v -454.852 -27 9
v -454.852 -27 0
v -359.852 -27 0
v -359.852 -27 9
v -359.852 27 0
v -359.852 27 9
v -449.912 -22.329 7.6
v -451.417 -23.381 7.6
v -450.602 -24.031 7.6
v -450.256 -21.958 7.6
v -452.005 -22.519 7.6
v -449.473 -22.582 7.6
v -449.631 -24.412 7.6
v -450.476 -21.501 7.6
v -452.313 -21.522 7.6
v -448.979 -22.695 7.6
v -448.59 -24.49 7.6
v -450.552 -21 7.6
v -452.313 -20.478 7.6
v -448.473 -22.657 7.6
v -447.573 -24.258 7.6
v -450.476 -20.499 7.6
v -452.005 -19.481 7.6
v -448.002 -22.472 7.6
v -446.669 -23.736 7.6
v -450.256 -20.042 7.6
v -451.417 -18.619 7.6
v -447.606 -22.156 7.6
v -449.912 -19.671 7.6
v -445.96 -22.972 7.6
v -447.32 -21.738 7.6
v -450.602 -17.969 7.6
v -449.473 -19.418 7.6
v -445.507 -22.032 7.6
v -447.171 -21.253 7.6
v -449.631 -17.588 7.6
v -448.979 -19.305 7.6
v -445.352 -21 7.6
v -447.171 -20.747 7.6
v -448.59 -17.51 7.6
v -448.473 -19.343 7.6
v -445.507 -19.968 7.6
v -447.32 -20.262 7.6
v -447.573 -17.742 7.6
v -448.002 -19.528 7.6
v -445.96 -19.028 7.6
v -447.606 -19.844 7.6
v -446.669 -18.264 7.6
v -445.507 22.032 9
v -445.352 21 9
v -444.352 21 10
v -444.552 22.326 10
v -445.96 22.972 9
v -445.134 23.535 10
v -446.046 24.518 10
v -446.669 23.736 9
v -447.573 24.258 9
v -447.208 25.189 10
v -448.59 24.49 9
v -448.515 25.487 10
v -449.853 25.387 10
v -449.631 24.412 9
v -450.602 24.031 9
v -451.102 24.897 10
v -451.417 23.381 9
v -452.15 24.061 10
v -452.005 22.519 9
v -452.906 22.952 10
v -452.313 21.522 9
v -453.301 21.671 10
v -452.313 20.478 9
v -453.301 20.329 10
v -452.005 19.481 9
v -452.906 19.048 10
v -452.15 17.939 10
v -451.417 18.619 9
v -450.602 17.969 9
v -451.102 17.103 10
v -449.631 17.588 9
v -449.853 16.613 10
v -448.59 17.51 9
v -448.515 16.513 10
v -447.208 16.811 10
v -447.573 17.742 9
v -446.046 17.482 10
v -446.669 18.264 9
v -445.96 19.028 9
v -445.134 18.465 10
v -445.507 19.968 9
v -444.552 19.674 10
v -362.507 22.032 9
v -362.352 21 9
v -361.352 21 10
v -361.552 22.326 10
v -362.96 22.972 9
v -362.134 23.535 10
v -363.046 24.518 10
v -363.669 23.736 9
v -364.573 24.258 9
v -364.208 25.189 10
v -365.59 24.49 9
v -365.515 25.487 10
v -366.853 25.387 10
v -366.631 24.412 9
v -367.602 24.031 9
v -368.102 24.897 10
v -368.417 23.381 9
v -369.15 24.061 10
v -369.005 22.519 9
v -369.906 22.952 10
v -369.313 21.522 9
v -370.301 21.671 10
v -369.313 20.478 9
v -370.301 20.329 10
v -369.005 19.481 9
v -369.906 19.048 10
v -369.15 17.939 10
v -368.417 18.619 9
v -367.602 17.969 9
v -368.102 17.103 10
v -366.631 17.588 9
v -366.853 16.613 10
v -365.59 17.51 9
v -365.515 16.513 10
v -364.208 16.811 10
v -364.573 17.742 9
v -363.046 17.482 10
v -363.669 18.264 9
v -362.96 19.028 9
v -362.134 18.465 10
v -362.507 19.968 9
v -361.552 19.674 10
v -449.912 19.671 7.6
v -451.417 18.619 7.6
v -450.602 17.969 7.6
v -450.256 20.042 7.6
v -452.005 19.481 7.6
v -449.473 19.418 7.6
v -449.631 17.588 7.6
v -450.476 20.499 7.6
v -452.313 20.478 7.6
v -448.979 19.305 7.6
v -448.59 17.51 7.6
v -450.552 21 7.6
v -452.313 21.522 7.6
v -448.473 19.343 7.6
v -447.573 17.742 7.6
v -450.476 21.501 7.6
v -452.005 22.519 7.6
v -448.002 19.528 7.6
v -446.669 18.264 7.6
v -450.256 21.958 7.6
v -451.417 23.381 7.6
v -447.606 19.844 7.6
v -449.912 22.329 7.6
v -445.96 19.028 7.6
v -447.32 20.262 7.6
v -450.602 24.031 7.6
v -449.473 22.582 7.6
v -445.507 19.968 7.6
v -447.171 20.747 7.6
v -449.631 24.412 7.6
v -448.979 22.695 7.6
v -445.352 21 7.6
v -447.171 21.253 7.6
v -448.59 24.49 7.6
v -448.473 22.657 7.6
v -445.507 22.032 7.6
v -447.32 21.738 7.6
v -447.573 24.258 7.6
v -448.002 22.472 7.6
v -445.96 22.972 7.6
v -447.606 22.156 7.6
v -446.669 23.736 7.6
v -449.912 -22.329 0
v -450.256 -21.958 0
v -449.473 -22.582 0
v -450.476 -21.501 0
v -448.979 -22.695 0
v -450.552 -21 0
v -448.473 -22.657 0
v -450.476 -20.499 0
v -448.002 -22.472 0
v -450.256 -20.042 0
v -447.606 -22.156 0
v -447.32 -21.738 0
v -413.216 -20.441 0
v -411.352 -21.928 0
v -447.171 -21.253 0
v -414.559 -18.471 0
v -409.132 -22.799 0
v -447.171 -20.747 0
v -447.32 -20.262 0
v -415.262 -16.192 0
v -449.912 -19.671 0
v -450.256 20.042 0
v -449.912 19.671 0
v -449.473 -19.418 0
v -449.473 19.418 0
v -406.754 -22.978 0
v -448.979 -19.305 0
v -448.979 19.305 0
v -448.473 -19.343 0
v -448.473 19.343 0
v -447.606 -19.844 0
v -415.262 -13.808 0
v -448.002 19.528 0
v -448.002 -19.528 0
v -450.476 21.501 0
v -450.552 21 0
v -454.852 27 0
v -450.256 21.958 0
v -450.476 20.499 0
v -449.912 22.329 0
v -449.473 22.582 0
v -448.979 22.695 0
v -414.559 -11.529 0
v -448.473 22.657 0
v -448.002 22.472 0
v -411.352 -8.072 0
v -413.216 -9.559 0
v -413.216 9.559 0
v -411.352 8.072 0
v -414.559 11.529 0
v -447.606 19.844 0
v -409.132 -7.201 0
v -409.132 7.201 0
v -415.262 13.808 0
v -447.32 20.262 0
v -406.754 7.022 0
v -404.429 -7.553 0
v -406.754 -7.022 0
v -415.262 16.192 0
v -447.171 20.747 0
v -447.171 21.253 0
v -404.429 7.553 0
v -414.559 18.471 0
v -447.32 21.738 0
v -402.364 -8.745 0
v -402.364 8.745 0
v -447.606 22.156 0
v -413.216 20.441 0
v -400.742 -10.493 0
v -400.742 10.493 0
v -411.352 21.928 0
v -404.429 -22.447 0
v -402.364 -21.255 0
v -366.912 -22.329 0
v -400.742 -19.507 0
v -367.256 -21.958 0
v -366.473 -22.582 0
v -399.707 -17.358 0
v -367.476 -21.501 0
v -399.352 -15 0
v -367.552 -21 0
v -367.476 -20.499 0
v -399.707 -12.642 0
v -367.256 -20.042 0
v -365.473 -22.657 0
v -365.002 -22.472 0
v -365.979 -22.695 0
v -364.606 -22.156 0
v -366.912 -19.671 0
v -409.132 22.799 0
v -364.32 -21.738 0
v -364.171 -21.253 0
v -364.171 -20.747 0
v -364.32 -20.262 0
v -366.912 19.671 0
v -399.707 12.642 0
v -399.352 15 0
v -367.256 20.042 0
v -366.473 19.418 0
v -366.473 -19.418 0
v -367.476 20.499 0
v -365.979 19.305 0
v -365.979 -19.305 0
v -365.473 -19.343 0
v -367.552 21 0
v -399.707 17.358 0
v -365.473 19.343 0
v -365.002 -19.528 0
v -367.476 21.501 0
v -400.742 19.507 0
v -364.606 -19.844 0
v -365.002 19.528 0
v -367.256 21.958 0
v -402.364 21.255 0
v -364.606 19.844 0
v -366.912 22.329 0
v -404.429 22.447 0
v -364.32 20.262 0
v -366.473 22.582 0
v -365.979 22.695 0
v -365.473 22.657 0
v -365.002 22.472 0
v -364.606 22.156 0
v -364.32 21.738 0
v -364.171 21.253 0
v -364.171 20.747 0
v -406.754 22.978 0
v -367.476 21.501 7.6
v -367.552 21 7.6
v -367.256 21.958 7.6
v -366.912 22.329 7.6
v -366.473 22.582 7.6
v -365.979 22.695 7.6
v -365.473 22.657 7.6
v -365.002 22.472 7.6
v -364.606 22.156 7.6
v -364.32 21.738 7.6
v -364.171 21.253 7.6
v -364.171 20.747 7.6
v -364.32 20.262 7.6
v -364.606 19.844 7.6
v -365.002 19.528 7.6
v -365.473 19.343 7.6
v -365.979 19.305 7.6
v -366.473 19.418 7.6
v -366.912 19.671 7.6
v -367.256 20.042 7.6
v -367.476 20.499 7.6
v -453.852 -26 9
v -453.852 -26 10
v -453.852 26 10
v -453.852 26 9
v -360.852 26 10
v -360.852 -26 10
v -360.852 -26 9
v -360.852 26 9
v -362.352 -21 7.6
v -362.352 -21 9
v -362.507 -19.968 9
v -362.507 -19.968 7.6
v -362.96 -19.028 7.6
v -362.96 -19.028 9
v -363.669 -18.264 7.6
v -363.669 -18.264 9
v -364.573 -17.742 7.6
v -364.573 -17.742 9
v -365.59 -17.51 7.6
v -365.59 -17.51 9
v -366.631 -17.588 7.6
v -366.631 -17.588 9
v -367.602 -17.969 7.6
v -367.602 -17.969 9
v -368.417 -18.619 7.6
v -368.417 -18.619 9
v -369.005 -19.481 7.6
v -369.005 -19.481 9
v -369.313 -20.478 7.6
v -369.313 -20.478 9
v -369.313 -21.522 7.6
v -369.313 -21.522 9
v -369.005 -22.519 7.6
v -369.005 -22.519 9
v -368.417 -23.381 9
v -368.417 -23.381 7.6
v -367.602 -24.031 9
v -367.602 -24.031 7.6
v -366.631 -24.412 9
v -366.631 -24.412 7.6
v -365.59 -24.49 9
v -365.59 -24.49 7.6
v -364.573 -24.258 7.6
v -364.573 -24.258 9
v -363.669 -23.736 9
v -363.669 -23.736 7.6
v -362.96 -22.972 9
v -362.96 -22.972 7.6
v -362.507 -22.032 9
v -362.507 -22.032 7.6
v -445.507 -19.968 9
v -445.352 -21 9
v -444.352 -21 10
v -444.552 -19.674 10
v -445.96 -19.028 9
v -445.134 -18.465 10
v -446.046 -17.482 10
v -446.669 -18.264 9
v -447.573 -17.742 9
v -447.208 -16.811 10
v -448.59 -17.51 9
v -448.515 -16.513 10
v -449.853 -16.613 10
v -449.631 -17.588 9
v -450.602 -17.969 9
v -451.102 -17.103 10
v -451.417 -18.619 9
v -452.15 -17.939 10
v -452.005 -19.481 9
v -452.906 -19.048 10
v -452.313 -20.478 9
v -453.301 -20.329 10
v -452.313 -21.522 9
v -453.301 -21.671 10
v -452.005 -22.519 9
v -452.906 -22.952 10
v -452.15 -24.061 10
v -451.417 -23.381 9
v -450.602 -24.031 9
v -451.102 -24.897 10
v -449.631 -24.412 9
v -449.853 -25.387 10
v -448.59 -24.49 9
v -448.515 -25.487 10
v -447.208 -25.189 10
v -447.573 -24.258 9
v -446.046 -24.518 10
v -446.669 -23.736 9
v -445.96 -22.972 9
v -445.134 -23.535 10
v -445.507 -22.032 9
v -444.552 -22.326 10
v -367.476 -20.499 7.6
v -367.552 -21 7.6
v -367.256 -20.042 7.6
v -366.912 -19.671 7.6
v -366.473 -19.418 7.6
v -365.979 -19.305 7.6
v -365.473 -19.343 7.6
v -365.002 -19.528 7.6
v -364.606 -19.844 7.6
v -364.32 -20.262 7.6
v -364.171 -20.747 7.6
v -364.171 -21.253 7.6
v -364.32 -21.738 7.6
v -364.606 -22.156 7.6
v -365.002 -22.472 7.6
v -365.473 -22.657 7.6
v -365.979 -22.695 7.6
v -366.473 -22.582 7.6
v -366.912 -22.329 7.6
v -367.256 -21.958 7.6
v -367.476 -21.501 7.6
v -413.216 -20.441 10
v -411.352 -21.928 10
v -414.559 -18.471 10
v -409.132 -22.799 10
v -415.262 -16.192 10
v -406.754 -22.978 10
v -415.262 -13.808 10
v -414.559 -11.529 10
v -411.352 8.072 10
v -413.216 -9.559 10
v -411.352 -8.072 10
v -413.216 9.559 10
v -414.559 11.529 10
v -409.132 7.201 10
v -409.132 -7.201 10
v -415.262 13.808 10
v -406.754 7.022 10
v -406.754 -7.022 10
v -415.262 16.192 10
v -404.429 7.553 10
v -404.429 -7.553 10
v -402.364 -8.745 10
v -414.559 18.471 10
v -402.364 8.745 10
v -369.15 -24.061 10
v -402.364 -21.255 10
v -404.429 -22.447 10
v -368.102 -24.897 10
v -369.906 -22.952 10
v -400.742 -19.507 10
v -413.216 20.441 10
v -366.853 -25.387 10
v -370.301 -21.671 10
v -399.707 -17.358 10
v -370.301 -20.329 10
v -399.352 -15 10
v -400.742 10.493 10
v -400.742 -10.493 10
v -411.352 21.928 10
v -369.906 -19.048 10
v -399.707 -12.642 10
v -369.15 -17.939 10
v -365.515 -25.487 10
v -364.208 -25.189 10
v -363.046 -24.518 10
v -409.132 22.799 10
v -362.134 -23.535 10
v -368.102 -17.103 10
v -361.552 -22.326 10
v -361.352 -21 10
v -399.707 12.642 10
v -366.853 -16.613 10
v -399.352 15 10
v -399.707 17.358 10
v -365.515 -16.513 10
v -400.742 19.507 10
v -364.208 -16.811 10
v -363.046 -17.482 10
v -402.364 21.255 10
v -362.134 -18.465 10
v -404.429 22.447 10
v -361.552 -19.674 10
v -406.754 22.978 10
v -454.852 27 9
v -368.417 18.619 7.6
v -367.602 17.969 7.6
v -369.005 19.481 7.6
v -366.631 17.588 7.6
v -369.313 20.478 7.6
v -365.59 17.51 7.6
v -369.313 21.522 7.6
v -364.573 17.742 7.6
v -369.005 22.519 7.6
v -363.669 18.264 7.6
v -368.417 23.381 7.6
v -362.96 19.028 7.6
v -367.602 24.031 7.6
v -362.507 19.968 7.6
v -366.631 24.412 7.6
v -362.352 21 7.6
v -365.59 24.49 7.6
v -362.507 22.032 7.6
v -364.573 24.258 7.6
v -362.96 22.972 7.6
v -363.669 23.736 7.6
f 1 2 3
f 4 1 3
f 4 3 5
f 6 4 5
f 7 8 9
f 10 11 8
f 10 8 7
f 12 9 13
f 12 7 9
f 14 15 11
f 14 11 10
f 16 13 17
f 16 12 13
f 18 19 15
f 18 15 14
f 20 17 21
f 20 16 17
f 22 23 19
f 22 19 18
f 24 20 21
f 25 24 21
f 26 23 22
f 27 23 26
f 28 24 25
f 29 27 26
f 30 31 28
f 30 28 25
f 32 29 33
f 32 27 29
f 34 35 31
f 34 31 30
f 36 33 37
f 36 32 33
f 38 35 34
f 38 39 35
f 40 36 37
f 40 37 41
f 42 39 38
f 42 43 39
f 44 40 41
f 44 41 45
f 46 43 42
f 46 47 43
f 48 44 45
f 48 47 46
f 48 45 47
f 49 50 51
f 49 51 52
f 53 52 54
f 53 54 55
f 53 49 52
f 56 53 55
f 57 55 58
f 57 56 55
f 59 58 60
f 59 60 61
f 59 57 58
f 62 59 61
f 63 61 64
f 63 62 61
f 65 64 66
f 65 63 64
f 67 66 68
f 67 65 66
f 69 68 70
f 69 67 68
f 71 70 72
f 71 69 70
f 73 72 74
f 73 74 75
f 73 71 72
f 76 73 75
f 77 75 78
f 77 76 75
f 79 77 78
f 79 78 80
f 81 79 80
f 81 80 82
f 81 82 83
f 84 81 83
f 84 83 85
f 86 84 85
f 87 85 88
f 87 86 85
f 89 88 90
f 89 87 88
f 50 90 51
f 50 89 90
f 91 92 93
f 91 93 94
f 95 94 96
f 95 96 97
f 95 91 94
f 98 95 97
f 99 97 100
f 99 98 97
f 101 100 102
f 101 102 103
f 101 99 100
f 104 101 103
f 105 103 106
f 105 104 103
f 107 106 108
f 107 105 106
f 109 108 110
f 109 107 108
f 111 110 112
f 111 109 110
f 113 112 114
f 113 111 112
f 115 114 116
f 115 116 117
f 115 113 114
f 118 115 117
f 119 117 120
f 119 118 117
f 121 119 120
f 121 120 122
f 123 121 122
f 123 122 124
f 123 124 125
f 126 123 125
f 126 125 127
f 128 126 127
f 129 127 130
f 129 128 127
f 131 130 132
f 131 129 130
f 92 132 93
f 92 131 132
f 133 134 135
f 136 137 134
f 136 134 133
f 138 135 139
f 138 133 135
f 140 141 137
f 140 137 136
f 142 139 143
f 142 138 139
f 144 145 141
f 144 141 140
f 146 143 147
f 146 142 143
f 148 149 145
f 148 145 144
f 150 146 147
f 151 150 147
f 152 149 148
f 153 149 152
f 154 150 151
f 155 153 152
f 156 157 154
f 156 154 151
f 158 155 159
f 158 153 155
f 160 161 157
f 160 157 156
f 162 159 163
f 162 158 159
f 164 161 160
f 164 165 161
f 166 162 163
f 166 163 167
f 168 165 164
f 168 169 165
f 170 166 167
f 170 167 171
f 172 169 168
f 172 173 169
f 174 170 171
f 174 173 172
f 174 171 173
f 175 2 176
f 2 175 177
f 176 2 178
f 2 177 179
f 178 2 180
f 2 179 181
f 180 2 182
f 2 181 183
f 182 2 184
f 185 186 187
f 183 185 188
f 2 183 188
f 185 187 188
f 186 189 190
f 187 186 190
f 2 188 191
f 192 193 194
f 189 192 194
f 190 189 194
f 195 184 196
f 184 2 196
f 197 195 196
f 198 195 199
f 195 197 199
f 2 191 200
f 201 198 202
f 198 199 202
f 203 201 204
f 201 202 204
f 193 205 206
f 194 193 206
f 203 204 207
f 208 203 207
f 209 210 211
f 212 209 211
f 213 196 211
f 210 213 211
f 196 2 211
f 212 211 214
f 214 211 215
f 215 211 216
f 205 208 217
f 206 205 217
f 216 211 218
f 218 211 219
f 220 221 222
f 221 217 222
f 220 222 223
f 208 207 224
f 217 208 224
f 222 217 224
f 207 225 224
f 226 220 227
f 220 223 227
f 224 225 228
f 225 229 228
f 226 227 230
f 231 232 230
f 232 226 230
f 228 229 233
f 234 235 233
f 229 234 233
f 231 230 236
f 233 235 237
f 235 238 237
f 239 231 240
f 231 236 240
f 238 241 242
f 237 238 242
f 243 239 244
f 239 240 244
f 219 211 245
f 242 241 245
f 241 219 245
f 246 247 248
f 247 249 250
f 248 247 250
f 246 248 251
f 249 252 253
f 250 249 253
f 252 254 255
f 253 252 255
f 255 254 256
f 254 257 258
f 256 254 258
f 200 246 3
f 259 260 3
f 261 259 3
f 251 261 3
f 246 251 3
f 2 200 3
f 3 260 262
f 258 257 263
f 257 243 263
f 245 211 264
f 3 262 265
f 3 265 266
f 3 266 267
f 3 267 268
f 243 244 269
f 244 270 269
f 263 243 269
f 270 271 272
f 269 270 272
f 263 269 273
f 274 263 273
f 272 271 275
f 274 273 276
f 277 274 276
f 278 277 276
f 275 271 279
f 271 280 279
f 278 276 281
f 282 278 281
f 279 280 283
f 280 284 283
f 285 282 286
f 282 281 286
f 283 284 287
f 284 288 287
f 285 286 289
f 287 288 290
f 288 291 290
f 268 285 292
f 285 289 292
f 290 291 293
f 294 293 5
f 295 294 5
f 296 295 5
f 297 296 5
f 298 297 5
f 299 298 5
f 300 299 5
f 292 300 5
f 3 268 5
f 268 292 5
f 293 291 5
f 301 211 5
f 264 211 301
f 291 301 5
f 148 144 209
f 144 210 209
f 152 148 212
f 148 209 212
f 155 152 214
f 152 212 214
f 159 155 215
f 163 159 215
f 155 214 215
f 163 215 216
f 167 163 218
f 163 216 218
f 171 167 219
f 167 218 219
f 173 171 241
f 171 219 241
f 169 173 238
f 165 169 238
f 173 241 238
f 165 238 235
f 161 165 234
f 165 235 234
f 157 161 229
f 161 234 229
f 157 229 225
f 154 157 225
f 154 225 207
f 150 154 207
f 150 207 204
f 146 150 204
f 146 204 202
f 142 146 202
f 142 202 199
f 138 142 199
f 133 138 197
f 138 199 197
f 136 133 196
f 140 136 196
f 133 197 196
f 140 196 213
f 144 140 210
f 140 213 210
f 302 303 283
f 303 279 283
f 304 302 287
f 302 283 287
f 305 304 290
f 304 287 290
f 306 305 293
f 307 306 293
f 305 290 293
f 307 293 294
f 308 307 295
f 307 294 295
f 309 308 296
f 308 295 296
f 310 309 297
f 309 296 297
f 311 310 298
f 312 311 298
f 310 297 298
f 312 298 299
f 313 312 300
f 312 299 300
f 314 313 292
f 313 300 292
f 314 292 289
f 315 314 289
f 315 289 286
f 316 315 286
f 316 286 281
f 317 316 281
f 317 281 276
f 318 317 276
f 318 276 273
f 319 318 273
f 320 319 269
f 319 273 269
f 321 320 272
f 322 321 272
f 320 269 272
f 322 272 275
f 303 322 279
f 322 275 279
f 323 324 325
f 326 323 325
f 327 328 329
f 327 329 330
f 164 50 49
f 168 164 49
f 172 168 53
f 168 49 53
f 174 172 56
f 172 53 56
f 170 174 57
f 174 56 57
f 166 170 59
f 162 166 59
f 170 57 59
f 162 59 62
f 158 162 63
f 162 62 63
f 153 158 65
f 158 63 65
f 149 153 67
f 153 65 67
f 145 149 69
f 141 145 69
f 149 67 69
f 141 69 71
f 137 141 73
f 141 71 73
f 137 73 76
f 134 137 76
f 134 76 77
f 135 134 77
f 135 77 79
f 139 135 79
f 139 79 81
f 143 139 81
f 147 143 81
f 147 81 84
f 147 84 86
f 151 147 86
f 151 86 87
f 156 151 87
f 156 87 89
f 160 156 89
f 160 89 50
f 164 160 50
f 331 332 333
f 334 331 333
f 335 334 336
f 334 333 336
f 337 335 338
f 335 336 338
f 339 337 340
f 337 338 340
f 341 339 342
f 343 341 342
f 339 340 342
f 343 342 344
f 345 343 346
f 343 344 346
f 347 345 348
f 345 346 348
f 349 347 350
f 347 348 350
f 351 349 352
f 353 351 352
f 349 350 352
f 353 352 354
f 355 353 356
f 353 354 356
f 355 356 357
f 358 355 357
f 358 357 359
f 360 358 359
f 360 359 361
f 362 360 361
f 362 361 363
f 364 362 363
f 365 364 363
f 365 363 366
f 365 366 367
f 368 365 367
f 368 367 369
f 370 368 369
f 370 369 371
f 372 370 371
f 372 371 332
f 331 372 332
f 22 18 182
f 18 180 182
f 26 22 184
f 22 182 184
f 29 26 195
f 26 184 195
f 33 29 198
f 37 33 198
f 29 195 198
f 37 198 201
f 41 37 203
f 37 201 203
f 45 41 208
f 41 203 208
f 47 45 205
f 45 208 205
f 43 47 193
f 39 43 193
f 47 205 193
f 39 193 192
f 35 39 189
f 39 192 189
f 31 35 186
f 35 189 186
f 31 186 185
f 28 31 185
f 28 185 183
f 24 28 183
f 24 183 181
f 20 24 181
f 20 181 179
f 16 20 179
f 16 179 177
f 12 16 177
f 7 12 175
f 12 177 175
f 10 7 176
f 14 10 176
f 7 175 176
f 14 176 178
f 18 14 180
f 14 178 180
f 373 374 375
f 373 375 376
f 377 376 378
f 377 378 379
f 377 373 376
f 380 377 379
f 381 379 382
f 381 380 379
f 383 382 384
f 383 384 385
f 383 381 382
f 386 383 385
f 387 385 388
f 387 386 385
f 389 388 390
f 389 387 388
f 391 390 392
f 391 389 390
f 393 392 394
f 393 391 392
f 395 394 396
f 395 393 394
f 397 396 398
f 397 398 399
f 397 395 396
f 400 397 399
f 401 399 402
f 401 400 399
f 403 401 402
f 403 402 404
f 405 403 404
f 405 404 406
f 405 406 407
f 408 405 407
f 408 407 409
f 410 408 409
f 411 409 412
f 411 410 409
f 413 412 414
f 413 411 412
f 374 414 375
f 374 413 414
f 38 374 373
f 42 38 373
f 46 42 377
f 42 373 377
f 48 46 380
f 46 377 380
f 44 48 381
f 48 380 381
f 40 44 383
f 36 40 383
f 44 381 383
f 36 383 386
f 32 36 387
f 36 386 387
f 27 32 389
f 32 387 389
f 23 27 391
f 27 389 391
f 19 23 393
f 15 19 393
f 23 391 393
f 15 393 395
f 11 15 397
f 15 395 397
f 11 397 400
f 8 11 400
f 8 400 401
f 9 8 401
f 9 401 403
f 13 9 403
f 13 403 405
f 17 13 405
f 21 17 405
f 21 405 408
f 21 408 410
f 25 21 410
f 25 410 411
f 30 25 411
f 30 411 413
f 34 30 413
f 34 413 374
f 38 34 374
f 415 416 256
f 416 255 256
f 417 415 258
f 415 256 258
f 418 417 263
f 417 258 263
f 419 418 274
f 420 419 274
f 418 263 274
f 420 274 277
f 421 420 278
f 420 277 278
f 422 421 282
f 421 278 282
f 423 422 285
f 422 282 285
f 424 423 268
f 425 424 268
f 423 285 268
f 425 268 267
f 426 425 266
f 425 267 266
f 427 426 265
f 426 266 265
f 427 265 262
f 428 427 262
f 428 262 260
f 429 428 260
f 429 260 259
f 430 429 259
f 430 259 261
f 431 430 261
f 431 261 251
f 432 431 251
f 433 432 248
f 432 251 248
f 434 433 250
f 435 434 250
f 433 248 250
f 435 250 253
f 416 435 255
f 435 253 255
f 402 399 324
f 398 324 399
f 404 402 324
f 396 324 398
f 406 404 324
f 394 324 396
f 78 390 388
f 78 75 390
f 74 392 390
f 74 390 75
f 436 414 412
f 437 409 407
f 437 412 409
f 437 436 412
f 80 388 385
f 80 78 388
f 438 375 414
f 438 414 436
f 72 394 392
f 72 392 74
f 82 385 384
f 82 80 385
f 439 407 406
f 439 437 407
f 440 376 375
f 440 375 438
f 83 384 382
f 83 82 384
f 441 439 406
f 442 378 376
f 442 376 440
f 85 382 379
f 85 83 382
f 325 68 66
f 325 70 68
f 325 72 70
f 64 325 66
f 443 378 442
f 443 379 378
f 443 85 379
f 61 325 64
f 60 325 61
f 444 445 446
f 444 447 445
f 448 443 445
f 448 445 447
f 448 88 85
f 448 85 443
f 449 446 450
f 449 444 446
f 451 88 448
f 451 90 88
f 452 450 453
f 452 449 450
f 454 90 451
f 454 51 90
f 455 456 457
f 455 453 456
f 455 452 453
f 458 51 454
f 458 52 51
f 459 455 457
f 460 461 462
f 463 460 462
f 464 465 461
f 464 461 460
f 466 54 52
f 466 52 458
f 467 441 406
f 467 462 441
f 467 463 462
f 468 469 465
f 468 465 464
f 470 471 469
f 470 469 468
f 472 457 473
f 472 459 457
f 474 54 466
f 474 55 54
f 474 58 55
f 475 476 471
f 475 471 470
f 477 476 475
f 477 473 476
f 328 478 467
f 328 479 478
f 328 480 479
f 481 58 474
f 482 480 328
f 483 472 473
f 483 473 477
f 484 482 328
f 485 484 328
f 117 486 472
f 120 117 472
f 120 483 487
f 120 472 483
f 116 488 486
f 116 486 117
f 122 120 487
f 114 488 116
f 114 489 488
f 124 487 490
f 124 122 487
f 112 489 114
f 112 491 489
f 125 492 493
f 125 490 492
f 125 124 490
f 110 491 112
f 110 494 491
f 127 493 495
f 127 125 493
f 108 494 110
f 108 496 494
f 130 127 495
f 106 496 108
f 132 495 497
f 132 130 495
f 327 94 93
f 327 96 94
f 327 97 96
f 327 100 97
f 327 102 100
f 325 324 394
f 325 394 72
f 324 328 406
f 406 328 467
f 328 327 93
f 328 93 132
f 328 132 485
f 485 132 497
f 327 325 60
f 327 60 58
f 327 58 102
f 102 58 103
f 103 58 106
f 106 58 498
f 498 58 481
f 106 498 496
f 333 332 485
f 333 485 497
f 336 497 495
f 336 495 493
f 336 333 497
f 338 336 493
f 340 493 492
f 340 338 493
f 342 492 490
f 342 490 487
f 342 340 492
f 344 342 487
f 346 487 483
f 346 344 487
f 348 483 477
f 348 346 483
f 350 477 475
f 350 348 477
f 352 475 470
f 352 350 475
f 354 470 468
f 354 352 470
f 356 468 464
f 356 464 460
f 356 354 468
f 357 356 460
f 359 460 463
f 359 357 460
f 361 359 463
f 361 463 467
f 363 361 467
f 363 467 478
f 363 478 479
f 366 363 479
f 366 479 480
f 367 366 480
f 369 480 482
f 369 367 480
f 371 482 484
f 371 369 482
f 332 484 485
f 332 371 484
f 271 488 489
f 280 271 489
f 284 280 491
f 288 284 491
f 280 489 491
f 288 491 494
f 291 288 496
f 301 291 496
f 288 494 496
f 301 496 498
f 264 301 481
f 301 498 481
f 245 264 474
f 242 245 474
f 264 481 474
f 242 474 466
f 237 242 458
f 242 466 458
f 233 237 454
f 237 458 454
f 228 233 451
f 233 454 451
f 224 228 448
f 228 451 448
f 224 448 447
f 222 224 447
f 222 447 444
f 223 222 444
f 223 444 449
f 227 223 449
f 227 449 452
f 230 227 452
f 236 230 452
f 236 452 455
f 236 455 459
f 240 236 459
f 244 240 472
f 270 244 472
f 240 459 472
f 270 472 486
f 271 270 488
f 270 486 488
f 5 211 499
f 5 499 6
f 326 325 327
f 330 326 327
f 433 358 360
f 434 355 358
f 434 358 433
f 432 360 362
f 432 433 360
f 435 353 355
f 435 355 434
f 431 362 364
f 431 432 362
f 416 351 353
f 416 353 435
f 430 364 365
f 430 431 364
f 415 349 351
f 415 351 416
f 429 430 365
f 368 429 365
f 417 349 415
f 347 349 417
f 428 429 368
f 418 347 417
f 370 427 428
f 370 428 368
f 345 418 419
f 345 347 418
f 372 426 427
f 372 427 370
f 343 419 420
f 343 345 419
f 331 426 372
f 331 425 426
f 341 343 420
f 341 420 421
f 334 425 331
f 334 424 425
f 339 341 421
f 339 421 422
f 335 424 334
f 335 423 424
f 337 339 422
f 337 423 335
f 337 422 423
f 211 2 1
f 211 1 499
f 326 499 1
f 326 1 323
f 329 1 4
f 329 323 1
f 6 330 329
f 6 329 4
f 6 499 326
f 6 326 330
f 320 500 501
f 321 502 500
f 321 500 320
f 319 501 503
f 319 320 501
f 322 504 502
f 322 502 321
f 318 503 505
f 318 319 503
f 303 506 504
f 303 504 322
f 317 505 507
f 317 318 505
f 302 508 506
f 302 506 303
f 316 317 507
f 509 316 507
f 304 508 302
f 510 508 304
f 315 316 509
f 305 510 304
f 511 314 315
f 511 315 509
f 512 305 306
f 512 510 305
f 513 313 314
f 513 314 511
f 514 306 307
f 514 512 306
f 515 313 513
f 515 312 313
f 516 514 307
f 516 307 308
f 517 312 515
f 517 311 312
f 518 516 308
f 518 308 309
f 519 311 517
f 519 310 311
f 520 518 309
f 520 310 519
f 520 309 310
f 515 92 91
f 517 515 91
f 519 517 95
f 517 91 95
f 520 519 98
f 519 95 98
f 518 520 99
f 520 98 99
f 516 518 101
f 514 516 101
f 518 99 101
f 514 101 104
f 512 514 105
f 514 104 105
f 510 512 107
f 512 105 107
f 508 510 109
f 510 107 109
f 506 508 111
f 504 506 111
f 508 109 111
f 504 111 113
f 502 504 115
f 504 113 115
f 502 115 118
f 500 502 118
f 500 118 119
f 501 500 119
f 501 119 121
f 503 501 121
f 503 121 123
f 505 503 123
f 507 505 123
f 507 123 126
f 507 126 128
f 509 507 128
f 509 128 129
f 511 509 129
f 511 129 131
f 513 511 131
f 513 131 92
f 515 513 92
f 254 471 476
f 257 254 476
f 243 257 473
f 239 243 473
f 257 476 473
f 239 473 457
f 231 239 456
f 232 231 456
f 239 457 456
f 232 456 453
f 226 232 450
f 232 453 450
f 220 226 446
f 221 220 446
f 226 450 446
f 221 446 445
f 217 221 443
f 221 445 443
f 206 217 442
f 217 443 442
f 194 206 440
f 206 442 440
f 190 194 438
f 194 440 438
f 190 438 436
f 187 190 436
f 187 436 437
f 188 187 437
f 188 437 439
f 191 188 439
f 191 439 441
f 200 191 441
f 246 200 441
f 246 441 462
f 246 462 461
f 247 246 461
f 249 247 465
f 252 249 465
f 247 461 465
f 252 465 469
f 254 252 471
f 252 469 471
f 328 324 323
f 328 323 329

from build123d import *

# Parameters (mm, degrees)
SKETCH1_W                                = 95
SKETCH1_H                                = 54
BOSS_EXTRUDE1_DEPTH                      = 10
SKETCH2_W                                = 95
SKETCH2_H                                = 54
SKETCH2_W_2                              = 93
SKETCH2_H_2                              = 52
CUT_EXTRUDE1_DEPTH                       = 1
CBORE_FOR_M3_PAN_HEAD_SCREW1_D           = 3.4
CBORE_FOR_M3_PAN_HEAD_SCREW1_CBORE_D     = 7
CBORE_FOR_M3_PAN_HEAD_SCREW1_CBORE_DEPTH = 2.4
CHAMFER1_SIZE                            = 1
SKETCH4_R                                = 8
CUT_EXTRUDE2_DEPTH                       = 10


with BuildPart() as part:
    # Sketch1 → Boss-Extrude1 (new body)
    with BuildSketch(Plane.XY):
        with Locations((-407.351708977, 0)):
            Rectangle(SKETCH1_W, SKETCH1_H)
    extrude(amount=BOSS_EXTRUDE1_DEPTH)

    # Sketch2 → Cut-Extrude1 (cut)
    with BuildSketch(Plane.XY.offset(10)):
        with Locations((-407.351708977, 0)):
            Rectangle(SKETCH2_W, SKETCH2_H)
        with Locations((-407.351708977, 0)):
            Rectangle(SKETCH2_W_2, SKETCH2_H_2, mode=Mode.SUBTRACT)
    extrude(amount=-CUT_EXTRUDE1_DEPTH, mode=Mode.SUBTRACT)

    # CBORE for M3 Pan Head Screw1 (through all)
    with Locations(Plane(origin=(-448.851708977, 21, 10), x_dir=(1, 0, 0), z_dir=(0, 0, 1))):
        with Locations((0, 0), (83, 0), (83, -42), (0, -42)):
            CounterBoreHole(CBORE_FOR_M3_PAN_HEAD_SCREW1_D / 2, CBORE_FOR_M3_PAN_HEAD_SCREW1_CBORE_D / 2, CBORE_FOR_M3_PAN_HEAD_SCREW1_CBORE_DEPTH)

    # Chamfer1
    chamfer1_edges = [part.edges().sort_by_distance(p)[0] for p in [
        (-452.351708977, -21, 10),
        (-369.351708977, -21, 10),
        (-369.351708977, 21, 10),
        (-452.351708977, 21, 10),
    ]]
    chamfer(chamfer1_edges, length=CHAMFER1_SIZE)

    # Sketch4 → Cut-Extrude2 (cut)
    with BuildSketch(Plane.XY.offset(10)):
        with Locations((-407.351708977, 15)):
            Circle(SKETCH4_R)
        with Locations((-407.351708977, -15)):
            Circle(SKETCH4_R)
    extrude(amount=-CUT_EXTRUDE2_DEPTH, mode=Mode.SUBTRACT)


solid = part.part
